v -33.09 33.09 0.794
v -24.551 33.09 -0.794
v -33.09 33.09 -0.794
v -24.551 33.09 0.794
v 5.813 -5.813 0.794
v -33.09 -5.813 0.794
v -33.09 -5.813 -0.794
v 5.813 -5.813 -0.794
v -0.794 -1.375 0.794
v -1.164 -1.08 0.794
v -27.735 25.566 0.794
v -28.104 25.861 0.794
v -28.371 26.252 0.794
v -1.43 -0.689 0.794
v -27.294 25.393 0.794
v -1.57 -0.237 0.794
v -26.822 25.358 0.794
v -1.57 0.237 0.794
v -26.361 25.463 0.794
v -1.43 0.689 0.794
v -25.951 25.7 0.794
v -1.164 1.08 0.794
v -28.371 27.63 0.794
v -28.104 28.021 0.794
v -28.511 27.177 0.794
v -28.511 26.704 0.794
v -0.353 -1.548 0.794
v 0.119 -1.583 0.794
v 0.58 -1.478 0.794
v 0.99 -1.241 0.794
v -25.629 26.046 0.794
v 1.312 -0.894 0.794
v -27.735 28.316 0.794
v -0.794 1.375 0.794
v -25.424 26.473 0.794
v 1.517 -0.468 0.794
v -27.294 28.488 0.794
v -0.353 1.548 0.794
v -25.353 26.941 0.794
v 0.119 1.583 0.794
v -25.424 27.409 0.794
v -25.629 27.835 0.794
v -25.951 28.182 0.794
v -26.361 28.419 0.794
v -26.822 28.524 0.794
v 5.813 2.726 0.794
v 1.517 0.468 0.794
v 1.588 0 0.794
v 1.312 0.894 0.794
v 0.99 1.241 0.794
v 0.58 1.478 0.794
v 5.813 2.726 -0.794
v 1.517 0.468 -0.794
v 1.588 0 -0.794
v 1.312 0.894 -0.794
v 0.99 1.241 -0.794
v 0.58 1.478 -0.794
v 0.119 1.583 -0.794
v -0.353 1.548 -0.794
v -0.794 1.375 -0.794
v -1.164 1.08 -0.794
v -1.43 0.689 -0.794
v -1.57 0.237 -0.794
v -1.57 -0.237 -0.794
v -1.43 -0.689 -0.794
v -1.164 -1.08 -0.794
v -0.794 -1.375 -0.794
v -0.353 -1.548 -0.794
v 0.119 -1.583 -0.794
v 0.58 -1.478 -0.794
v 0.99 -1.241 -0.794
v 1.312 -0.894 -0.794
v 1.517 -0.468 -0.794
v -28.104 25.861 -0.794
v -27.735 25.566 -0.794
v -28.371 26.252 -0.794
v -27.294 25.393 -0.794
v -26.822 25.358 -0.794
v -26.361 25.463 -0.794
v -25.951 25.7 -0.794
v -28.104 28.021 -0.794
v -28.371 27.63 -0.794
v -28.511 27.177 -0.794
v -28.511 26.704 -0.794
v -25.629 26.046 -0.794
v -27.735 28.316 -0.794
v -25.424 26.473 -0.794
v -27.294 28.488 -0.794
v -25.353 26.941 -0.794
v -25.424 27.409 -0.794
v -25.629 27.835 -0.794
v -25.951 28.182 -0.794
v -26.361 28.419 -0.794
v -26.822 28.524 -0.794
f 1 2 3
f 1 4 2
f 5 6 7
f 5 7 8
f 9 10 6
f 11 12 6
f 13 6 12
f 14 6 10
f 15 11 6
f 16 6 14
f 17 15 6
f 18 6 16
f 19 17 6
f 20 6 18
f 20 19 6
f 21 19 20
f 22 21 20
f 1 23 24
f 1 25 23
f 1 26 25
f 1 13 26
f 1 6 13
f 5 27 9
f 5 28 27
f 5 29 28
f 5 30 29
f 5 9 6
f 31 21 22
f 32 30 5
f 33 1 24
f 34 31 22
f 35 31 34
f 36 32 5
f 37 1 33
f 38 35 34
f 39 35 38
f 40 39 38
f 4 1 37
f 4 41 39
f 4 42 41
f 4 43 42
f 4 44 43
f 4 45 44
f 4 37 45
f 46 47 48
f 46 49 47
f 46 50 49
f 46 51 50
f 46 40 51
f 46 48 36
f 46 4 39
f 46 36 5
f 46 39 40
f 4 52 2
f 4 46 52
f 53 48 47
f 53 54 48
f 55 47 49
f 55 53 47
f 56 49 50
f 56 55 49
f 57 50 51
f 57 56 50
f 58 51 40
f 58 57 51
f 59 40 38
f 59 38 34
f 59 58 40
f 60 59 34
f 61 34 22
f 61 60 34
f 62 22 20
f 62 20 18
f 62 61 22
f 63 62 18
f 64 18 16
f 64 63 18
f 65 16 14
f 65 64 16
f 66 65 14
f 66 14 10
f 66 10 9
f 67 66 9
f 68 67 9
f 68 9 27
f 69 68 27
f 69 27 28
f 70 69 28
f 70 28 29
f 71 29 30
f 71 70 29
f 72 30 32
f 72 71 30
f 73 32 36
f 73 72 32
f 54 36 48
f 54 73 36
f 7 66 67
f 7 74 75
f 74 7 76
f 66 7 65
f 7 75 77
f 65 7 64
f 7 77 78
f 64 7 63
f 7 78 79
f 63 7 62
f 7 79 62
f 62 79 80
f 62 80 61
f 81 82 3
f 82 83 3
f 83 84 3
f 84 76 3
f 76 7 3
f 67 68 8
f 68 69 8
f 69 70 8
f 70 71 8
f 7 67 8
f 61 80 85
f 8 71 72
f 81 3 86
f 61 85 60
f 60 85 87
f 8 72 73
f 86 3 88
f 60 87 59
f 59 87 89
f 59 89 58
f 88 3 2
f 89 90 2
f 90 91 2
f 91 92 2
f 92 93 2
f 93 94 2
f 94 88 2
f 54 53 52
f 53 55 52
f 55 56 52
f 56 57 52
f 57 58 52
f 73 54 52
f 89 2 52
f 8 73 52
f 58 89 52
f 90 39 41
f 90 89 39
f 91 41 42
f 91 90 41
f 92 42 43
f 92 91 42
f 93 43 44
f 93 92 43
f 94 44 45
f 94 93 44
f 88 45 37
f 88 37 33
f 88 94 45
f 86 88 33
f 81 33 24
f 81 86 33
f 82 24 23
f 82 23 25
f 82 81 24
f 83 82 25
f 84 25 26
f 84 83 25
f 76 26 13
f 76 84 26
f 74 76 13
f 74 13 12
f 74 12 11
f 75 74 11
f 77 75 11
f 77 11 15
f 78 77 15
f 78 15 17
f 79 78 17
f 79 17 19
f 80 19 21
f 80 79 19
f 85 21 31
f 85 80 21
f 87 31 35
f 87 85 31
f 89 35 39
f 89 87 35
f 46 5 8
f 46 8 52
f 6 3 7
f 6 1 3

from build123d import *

# Parameters (mm, degrees)
F0_R     = 1.5875
F1_DEPTH = 0.79375


with BuildPart() as f1:
    # F0 (on Top) → F1 (new body, symmetric)
    with BuildSketch(Plane.XY):
        Polygon((-33.090407, 33.090407), (-33.090407, -5.813425), (5.813425, -5.813425), (5.813425, 2.72617), (-24.550812, 33.090407), align=None)
        Circle(F0_R, mode=Mode.SUBTRACT)
        with Locations((-26.940768, 26.940768)):
            Circle(F0_R, mode=Mode.SUBTRACT)
    extrude(amount=F1_DEPTH, both=True)


solid = f1.part
